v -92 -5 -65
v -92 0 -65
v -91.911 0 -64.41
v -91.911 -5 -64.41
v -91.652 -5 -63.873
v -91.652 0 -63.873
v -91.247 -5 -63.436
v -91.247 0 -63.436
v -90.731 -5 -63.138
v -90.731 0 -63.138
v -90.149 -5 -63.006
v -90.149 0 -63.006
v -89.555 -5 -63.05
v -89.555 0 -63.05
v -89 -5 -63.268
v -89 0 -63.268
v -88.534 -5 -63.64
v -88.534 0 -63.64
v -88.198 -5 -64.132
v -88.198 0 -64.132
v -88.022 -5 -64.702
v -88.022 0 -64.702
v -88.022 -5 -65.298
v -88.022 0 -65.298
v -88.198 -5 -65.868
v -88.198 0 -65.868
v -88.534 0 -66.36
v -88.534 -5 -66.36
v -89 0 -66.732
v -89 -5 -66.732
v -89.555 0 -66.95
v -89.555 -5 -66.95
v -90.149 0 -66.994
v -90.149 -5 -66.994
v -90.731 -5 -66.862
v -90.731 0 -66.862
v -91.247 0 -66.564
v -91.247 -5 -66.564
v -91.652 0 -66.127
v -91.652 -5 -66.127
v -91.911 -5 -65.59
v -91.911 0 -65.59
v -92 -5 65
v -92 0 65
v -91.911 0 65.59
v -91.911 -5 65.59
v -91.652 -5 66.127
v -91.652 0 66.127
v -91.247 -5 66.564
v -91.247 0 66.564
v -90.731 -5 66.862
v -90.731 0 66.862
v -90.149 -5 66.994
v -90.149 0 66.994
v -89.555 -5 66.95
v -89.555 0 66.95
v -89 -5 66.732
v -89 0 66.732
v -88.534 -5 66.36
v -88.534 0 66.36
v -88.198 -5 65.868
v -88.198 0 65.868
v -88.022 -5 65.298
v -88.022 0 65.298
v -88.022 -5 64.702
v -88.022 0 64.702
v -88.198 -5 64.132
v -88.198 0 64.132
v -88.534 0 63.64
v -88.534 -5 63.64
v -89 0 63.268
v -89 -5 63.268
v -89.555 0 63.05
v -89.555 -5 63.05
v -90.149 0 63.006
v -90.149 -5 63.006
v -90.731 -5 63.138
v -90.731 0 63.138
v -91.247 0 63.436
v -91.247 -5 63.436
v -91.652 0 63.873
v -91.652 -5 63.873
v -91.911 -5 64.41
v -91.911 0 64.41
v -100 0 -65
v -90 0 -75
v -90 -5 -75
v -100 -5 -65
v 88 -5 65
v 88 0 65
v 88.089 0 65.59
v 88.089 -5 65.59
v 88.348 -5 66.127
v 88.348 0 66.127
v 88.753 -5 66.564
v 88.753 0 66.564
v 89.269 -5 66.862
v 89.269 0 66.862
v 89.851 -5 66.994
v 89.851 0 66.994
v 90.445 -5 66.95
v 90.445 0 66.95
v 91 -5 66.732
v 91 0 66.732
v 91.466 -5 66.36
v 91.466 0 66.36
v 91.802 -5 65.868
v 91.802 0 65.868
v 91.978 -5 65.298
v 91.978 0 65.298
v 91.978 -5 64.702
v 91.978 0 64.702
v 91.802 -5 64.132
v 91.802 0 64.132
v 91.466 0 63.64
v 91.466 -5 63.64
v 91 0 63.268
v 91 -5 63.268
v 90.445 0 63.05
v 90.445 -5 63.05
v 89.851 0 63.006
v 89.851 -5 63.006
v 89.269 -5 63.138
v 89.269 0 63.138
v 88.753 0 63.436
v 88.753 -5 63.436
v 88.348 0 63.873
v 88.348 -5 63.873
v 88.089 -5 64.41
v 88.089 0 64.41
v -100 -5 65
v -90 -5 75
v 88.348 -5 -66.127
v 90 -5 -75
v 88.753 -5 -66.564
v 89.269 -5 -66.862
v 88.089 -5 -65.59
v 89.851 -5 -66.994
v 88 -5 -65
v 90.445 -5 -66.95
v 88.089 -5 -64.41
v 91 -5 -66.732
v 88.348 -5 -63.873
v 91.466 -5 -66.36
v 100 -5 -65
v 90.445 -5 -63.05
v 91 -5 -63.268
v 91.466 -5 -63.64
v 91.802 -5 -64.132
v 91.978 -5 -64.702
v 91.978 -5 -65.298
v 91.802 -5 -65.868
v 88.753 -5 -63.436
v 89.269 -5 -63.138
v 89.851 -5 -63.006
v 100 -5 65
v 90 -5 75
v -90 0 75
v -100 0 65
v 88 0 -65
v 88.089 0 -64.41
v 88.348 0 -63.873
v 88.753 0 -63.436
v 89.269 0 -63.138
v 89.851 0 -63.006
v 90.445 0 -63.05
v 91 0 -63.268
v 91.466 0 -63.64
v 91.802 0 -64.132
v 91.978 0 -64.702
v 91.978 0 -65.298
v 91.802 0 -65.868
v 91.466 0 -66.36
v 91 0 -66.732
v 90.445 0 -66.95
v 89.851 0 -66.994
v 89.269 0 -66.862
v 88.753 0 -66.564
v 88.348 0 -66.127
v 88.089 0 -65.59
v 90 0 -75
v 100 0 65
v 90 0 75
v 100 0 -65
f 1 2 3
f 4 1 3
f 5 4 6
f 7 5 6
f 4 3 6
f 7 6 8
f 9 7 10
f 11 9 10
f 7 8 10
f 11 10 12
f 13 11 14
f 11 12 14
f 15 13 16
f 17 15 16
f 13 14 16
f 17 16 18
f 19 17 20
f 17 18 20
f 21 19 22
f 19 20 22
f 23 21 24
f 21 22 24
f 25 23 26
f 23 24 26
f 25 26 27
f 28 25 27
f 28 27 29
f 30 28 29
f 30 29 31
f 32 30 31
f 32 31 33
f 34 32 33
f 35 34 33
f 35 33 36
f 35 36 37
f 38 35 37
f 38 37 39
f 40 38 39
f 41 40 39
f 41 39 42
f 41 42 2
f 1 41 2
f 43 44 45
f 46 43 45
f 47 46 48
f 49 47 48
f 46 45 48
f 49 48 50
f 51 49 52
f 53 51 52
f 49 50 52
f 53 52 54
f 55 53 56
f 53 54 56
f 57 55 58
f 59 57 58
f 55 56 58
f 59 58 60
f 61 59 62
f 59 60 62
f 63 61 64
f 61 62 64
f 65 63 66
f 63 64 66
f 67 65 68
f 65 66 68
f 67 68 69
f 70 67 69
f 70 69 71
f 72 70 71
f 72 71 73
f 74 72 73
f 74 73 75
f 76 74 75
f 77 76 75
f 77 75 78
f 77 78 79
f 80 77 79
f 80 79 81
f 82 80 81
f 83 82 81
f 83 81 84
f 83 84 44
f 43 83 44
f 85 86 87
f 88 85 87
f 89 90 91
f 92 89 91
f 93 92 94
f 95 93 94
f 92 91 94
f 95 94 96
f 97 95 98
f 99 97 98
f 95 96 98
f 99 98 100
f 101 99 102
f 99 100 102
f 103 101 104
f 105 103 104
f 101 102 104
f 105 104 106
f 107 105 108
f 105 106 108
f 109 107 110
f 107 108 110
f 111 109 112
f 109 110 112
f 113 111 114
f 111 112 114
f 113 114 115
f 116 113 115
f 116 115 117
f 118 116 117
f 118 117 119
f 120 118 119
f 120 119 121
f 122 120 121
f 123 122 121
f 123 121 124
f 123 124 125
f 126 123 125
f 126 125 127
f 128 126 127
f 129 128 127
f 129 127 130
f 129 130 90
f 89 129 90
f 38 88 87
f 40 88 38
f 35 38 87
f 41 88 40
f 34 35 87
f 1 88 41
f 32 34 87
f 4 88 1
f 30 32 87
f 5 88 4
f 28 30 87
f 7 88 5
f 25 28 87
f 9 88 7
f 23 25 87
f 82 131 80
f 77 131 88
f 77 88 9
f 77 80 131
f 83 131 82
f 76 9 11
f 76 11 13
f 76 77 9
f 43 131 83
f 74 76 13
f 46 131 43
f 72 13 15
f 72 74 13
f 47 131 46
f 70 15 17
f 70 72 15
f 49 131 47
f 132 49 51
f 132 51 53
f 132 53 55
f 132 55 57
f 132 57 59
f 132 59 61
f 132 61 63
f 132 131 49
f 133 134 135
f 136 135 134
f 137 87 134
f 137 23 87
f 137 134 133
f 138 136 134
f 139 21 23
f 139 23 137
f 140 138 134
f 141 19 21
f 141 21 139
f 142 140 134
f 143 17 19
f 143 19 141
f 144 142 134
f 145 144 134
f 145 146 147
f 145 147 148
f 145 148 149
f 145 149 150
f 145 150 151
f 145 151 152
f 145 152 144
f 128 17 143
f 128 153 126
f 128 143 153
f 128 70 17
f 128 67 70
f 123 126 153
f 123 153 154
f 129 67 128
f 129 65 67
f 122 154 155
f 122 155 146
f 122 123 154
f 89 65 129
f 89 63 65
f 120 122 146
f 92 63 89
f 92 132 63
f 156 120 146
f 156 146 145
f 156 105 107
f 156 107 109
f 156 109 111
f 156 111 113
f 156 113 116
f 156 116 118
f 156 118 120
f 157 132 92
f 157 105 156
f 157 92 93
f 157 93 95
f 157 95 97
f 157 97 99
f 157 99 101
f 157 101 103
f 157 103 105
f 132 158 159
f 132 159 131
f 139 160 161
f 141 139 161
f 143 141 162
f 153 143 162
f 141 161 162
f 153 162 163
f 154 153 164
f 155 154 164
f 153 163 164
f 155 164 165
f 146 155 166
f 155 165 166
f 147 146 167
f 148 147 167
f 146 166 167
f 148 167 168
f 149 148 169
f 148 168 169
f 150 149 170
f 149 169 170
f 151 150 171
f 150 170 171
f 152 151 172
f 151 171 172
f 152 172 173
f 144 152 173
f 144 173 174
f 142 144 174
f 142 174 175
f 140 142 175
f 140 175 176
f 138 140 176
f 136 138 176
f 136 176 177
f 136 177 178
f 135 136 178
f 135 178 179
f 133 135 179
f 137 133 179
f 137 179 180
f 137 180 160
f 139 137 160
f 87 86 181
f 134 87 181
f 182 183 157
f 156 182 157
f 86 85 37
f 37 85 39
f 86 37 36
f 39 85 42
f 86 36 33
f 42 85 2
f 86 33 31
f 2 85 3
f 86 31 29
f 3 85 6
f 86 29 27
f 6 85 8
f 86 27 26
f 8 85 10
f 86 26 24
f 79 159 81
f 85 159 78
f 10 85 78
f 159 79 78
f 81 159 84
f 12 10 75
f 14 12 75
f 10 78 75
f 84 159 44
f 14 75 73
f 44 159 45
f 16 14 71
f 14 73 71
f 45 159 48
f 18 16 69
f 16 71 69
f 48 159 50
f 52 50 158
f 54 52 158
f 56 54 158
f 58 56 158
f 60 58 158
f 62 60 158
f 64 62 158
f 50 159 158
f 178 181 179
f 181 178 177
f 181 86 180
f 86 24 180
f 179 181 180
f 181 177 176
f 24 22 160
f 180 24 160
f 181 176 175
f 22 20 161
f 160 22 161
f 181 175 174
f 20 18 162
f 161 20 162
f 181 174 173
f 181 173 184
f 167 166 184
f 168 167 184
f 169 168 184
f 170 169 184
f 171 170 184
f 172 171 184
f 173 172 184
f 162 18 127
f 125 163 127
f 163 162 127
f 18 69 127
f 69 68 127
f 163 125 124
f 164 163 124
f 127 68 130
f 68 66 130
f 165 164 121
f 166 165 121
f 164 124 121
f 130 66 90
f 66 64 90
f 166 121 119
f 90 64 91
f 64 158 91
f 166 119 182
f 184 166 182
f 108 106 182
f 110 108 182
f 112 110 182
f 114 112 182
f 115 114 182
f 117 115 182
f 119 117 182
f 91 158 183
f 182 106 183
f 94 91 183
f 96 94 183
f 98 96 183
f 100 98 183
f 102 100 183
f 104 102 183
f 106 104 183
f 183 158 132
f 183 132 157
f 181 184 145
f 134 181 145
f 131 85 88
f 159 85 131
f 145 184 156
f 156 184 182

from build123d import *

# Parameters (mm, degrees)
F0_W     = 200
F0_H     = 150
F1_DEPTH = 5
F2_SIZE  = 10
F4_D     = 4
F4_DEPTH = 8


with BuildPart() as f1:
    # F0 (on Front) → F1 (new body)
    with BuildSketch(Plane.XZ):
        Rectangle(F0_W, F0_H)
    extrude(amount=F1_DEPTH)

    # F2
    f2_edges = [f1.edges().sort_by_distance(p)[0] for p in [
        (-100, -2.5, 75),
        (100, -2.5, 75),
        (-100, -2.5, -75),
        (100, -2.5, -75),
    ]]
    chamfer(f2_edges, length=F2_SIZE)

    # F4
    with Locations(Plane.XZ.offset(5)):
        with Locations((90, -65), (-90, -65), (-90, 65), (90, 65)):
            Hole(F4_D / 2, depth=F4_DEPTH)


solid = f1.part
